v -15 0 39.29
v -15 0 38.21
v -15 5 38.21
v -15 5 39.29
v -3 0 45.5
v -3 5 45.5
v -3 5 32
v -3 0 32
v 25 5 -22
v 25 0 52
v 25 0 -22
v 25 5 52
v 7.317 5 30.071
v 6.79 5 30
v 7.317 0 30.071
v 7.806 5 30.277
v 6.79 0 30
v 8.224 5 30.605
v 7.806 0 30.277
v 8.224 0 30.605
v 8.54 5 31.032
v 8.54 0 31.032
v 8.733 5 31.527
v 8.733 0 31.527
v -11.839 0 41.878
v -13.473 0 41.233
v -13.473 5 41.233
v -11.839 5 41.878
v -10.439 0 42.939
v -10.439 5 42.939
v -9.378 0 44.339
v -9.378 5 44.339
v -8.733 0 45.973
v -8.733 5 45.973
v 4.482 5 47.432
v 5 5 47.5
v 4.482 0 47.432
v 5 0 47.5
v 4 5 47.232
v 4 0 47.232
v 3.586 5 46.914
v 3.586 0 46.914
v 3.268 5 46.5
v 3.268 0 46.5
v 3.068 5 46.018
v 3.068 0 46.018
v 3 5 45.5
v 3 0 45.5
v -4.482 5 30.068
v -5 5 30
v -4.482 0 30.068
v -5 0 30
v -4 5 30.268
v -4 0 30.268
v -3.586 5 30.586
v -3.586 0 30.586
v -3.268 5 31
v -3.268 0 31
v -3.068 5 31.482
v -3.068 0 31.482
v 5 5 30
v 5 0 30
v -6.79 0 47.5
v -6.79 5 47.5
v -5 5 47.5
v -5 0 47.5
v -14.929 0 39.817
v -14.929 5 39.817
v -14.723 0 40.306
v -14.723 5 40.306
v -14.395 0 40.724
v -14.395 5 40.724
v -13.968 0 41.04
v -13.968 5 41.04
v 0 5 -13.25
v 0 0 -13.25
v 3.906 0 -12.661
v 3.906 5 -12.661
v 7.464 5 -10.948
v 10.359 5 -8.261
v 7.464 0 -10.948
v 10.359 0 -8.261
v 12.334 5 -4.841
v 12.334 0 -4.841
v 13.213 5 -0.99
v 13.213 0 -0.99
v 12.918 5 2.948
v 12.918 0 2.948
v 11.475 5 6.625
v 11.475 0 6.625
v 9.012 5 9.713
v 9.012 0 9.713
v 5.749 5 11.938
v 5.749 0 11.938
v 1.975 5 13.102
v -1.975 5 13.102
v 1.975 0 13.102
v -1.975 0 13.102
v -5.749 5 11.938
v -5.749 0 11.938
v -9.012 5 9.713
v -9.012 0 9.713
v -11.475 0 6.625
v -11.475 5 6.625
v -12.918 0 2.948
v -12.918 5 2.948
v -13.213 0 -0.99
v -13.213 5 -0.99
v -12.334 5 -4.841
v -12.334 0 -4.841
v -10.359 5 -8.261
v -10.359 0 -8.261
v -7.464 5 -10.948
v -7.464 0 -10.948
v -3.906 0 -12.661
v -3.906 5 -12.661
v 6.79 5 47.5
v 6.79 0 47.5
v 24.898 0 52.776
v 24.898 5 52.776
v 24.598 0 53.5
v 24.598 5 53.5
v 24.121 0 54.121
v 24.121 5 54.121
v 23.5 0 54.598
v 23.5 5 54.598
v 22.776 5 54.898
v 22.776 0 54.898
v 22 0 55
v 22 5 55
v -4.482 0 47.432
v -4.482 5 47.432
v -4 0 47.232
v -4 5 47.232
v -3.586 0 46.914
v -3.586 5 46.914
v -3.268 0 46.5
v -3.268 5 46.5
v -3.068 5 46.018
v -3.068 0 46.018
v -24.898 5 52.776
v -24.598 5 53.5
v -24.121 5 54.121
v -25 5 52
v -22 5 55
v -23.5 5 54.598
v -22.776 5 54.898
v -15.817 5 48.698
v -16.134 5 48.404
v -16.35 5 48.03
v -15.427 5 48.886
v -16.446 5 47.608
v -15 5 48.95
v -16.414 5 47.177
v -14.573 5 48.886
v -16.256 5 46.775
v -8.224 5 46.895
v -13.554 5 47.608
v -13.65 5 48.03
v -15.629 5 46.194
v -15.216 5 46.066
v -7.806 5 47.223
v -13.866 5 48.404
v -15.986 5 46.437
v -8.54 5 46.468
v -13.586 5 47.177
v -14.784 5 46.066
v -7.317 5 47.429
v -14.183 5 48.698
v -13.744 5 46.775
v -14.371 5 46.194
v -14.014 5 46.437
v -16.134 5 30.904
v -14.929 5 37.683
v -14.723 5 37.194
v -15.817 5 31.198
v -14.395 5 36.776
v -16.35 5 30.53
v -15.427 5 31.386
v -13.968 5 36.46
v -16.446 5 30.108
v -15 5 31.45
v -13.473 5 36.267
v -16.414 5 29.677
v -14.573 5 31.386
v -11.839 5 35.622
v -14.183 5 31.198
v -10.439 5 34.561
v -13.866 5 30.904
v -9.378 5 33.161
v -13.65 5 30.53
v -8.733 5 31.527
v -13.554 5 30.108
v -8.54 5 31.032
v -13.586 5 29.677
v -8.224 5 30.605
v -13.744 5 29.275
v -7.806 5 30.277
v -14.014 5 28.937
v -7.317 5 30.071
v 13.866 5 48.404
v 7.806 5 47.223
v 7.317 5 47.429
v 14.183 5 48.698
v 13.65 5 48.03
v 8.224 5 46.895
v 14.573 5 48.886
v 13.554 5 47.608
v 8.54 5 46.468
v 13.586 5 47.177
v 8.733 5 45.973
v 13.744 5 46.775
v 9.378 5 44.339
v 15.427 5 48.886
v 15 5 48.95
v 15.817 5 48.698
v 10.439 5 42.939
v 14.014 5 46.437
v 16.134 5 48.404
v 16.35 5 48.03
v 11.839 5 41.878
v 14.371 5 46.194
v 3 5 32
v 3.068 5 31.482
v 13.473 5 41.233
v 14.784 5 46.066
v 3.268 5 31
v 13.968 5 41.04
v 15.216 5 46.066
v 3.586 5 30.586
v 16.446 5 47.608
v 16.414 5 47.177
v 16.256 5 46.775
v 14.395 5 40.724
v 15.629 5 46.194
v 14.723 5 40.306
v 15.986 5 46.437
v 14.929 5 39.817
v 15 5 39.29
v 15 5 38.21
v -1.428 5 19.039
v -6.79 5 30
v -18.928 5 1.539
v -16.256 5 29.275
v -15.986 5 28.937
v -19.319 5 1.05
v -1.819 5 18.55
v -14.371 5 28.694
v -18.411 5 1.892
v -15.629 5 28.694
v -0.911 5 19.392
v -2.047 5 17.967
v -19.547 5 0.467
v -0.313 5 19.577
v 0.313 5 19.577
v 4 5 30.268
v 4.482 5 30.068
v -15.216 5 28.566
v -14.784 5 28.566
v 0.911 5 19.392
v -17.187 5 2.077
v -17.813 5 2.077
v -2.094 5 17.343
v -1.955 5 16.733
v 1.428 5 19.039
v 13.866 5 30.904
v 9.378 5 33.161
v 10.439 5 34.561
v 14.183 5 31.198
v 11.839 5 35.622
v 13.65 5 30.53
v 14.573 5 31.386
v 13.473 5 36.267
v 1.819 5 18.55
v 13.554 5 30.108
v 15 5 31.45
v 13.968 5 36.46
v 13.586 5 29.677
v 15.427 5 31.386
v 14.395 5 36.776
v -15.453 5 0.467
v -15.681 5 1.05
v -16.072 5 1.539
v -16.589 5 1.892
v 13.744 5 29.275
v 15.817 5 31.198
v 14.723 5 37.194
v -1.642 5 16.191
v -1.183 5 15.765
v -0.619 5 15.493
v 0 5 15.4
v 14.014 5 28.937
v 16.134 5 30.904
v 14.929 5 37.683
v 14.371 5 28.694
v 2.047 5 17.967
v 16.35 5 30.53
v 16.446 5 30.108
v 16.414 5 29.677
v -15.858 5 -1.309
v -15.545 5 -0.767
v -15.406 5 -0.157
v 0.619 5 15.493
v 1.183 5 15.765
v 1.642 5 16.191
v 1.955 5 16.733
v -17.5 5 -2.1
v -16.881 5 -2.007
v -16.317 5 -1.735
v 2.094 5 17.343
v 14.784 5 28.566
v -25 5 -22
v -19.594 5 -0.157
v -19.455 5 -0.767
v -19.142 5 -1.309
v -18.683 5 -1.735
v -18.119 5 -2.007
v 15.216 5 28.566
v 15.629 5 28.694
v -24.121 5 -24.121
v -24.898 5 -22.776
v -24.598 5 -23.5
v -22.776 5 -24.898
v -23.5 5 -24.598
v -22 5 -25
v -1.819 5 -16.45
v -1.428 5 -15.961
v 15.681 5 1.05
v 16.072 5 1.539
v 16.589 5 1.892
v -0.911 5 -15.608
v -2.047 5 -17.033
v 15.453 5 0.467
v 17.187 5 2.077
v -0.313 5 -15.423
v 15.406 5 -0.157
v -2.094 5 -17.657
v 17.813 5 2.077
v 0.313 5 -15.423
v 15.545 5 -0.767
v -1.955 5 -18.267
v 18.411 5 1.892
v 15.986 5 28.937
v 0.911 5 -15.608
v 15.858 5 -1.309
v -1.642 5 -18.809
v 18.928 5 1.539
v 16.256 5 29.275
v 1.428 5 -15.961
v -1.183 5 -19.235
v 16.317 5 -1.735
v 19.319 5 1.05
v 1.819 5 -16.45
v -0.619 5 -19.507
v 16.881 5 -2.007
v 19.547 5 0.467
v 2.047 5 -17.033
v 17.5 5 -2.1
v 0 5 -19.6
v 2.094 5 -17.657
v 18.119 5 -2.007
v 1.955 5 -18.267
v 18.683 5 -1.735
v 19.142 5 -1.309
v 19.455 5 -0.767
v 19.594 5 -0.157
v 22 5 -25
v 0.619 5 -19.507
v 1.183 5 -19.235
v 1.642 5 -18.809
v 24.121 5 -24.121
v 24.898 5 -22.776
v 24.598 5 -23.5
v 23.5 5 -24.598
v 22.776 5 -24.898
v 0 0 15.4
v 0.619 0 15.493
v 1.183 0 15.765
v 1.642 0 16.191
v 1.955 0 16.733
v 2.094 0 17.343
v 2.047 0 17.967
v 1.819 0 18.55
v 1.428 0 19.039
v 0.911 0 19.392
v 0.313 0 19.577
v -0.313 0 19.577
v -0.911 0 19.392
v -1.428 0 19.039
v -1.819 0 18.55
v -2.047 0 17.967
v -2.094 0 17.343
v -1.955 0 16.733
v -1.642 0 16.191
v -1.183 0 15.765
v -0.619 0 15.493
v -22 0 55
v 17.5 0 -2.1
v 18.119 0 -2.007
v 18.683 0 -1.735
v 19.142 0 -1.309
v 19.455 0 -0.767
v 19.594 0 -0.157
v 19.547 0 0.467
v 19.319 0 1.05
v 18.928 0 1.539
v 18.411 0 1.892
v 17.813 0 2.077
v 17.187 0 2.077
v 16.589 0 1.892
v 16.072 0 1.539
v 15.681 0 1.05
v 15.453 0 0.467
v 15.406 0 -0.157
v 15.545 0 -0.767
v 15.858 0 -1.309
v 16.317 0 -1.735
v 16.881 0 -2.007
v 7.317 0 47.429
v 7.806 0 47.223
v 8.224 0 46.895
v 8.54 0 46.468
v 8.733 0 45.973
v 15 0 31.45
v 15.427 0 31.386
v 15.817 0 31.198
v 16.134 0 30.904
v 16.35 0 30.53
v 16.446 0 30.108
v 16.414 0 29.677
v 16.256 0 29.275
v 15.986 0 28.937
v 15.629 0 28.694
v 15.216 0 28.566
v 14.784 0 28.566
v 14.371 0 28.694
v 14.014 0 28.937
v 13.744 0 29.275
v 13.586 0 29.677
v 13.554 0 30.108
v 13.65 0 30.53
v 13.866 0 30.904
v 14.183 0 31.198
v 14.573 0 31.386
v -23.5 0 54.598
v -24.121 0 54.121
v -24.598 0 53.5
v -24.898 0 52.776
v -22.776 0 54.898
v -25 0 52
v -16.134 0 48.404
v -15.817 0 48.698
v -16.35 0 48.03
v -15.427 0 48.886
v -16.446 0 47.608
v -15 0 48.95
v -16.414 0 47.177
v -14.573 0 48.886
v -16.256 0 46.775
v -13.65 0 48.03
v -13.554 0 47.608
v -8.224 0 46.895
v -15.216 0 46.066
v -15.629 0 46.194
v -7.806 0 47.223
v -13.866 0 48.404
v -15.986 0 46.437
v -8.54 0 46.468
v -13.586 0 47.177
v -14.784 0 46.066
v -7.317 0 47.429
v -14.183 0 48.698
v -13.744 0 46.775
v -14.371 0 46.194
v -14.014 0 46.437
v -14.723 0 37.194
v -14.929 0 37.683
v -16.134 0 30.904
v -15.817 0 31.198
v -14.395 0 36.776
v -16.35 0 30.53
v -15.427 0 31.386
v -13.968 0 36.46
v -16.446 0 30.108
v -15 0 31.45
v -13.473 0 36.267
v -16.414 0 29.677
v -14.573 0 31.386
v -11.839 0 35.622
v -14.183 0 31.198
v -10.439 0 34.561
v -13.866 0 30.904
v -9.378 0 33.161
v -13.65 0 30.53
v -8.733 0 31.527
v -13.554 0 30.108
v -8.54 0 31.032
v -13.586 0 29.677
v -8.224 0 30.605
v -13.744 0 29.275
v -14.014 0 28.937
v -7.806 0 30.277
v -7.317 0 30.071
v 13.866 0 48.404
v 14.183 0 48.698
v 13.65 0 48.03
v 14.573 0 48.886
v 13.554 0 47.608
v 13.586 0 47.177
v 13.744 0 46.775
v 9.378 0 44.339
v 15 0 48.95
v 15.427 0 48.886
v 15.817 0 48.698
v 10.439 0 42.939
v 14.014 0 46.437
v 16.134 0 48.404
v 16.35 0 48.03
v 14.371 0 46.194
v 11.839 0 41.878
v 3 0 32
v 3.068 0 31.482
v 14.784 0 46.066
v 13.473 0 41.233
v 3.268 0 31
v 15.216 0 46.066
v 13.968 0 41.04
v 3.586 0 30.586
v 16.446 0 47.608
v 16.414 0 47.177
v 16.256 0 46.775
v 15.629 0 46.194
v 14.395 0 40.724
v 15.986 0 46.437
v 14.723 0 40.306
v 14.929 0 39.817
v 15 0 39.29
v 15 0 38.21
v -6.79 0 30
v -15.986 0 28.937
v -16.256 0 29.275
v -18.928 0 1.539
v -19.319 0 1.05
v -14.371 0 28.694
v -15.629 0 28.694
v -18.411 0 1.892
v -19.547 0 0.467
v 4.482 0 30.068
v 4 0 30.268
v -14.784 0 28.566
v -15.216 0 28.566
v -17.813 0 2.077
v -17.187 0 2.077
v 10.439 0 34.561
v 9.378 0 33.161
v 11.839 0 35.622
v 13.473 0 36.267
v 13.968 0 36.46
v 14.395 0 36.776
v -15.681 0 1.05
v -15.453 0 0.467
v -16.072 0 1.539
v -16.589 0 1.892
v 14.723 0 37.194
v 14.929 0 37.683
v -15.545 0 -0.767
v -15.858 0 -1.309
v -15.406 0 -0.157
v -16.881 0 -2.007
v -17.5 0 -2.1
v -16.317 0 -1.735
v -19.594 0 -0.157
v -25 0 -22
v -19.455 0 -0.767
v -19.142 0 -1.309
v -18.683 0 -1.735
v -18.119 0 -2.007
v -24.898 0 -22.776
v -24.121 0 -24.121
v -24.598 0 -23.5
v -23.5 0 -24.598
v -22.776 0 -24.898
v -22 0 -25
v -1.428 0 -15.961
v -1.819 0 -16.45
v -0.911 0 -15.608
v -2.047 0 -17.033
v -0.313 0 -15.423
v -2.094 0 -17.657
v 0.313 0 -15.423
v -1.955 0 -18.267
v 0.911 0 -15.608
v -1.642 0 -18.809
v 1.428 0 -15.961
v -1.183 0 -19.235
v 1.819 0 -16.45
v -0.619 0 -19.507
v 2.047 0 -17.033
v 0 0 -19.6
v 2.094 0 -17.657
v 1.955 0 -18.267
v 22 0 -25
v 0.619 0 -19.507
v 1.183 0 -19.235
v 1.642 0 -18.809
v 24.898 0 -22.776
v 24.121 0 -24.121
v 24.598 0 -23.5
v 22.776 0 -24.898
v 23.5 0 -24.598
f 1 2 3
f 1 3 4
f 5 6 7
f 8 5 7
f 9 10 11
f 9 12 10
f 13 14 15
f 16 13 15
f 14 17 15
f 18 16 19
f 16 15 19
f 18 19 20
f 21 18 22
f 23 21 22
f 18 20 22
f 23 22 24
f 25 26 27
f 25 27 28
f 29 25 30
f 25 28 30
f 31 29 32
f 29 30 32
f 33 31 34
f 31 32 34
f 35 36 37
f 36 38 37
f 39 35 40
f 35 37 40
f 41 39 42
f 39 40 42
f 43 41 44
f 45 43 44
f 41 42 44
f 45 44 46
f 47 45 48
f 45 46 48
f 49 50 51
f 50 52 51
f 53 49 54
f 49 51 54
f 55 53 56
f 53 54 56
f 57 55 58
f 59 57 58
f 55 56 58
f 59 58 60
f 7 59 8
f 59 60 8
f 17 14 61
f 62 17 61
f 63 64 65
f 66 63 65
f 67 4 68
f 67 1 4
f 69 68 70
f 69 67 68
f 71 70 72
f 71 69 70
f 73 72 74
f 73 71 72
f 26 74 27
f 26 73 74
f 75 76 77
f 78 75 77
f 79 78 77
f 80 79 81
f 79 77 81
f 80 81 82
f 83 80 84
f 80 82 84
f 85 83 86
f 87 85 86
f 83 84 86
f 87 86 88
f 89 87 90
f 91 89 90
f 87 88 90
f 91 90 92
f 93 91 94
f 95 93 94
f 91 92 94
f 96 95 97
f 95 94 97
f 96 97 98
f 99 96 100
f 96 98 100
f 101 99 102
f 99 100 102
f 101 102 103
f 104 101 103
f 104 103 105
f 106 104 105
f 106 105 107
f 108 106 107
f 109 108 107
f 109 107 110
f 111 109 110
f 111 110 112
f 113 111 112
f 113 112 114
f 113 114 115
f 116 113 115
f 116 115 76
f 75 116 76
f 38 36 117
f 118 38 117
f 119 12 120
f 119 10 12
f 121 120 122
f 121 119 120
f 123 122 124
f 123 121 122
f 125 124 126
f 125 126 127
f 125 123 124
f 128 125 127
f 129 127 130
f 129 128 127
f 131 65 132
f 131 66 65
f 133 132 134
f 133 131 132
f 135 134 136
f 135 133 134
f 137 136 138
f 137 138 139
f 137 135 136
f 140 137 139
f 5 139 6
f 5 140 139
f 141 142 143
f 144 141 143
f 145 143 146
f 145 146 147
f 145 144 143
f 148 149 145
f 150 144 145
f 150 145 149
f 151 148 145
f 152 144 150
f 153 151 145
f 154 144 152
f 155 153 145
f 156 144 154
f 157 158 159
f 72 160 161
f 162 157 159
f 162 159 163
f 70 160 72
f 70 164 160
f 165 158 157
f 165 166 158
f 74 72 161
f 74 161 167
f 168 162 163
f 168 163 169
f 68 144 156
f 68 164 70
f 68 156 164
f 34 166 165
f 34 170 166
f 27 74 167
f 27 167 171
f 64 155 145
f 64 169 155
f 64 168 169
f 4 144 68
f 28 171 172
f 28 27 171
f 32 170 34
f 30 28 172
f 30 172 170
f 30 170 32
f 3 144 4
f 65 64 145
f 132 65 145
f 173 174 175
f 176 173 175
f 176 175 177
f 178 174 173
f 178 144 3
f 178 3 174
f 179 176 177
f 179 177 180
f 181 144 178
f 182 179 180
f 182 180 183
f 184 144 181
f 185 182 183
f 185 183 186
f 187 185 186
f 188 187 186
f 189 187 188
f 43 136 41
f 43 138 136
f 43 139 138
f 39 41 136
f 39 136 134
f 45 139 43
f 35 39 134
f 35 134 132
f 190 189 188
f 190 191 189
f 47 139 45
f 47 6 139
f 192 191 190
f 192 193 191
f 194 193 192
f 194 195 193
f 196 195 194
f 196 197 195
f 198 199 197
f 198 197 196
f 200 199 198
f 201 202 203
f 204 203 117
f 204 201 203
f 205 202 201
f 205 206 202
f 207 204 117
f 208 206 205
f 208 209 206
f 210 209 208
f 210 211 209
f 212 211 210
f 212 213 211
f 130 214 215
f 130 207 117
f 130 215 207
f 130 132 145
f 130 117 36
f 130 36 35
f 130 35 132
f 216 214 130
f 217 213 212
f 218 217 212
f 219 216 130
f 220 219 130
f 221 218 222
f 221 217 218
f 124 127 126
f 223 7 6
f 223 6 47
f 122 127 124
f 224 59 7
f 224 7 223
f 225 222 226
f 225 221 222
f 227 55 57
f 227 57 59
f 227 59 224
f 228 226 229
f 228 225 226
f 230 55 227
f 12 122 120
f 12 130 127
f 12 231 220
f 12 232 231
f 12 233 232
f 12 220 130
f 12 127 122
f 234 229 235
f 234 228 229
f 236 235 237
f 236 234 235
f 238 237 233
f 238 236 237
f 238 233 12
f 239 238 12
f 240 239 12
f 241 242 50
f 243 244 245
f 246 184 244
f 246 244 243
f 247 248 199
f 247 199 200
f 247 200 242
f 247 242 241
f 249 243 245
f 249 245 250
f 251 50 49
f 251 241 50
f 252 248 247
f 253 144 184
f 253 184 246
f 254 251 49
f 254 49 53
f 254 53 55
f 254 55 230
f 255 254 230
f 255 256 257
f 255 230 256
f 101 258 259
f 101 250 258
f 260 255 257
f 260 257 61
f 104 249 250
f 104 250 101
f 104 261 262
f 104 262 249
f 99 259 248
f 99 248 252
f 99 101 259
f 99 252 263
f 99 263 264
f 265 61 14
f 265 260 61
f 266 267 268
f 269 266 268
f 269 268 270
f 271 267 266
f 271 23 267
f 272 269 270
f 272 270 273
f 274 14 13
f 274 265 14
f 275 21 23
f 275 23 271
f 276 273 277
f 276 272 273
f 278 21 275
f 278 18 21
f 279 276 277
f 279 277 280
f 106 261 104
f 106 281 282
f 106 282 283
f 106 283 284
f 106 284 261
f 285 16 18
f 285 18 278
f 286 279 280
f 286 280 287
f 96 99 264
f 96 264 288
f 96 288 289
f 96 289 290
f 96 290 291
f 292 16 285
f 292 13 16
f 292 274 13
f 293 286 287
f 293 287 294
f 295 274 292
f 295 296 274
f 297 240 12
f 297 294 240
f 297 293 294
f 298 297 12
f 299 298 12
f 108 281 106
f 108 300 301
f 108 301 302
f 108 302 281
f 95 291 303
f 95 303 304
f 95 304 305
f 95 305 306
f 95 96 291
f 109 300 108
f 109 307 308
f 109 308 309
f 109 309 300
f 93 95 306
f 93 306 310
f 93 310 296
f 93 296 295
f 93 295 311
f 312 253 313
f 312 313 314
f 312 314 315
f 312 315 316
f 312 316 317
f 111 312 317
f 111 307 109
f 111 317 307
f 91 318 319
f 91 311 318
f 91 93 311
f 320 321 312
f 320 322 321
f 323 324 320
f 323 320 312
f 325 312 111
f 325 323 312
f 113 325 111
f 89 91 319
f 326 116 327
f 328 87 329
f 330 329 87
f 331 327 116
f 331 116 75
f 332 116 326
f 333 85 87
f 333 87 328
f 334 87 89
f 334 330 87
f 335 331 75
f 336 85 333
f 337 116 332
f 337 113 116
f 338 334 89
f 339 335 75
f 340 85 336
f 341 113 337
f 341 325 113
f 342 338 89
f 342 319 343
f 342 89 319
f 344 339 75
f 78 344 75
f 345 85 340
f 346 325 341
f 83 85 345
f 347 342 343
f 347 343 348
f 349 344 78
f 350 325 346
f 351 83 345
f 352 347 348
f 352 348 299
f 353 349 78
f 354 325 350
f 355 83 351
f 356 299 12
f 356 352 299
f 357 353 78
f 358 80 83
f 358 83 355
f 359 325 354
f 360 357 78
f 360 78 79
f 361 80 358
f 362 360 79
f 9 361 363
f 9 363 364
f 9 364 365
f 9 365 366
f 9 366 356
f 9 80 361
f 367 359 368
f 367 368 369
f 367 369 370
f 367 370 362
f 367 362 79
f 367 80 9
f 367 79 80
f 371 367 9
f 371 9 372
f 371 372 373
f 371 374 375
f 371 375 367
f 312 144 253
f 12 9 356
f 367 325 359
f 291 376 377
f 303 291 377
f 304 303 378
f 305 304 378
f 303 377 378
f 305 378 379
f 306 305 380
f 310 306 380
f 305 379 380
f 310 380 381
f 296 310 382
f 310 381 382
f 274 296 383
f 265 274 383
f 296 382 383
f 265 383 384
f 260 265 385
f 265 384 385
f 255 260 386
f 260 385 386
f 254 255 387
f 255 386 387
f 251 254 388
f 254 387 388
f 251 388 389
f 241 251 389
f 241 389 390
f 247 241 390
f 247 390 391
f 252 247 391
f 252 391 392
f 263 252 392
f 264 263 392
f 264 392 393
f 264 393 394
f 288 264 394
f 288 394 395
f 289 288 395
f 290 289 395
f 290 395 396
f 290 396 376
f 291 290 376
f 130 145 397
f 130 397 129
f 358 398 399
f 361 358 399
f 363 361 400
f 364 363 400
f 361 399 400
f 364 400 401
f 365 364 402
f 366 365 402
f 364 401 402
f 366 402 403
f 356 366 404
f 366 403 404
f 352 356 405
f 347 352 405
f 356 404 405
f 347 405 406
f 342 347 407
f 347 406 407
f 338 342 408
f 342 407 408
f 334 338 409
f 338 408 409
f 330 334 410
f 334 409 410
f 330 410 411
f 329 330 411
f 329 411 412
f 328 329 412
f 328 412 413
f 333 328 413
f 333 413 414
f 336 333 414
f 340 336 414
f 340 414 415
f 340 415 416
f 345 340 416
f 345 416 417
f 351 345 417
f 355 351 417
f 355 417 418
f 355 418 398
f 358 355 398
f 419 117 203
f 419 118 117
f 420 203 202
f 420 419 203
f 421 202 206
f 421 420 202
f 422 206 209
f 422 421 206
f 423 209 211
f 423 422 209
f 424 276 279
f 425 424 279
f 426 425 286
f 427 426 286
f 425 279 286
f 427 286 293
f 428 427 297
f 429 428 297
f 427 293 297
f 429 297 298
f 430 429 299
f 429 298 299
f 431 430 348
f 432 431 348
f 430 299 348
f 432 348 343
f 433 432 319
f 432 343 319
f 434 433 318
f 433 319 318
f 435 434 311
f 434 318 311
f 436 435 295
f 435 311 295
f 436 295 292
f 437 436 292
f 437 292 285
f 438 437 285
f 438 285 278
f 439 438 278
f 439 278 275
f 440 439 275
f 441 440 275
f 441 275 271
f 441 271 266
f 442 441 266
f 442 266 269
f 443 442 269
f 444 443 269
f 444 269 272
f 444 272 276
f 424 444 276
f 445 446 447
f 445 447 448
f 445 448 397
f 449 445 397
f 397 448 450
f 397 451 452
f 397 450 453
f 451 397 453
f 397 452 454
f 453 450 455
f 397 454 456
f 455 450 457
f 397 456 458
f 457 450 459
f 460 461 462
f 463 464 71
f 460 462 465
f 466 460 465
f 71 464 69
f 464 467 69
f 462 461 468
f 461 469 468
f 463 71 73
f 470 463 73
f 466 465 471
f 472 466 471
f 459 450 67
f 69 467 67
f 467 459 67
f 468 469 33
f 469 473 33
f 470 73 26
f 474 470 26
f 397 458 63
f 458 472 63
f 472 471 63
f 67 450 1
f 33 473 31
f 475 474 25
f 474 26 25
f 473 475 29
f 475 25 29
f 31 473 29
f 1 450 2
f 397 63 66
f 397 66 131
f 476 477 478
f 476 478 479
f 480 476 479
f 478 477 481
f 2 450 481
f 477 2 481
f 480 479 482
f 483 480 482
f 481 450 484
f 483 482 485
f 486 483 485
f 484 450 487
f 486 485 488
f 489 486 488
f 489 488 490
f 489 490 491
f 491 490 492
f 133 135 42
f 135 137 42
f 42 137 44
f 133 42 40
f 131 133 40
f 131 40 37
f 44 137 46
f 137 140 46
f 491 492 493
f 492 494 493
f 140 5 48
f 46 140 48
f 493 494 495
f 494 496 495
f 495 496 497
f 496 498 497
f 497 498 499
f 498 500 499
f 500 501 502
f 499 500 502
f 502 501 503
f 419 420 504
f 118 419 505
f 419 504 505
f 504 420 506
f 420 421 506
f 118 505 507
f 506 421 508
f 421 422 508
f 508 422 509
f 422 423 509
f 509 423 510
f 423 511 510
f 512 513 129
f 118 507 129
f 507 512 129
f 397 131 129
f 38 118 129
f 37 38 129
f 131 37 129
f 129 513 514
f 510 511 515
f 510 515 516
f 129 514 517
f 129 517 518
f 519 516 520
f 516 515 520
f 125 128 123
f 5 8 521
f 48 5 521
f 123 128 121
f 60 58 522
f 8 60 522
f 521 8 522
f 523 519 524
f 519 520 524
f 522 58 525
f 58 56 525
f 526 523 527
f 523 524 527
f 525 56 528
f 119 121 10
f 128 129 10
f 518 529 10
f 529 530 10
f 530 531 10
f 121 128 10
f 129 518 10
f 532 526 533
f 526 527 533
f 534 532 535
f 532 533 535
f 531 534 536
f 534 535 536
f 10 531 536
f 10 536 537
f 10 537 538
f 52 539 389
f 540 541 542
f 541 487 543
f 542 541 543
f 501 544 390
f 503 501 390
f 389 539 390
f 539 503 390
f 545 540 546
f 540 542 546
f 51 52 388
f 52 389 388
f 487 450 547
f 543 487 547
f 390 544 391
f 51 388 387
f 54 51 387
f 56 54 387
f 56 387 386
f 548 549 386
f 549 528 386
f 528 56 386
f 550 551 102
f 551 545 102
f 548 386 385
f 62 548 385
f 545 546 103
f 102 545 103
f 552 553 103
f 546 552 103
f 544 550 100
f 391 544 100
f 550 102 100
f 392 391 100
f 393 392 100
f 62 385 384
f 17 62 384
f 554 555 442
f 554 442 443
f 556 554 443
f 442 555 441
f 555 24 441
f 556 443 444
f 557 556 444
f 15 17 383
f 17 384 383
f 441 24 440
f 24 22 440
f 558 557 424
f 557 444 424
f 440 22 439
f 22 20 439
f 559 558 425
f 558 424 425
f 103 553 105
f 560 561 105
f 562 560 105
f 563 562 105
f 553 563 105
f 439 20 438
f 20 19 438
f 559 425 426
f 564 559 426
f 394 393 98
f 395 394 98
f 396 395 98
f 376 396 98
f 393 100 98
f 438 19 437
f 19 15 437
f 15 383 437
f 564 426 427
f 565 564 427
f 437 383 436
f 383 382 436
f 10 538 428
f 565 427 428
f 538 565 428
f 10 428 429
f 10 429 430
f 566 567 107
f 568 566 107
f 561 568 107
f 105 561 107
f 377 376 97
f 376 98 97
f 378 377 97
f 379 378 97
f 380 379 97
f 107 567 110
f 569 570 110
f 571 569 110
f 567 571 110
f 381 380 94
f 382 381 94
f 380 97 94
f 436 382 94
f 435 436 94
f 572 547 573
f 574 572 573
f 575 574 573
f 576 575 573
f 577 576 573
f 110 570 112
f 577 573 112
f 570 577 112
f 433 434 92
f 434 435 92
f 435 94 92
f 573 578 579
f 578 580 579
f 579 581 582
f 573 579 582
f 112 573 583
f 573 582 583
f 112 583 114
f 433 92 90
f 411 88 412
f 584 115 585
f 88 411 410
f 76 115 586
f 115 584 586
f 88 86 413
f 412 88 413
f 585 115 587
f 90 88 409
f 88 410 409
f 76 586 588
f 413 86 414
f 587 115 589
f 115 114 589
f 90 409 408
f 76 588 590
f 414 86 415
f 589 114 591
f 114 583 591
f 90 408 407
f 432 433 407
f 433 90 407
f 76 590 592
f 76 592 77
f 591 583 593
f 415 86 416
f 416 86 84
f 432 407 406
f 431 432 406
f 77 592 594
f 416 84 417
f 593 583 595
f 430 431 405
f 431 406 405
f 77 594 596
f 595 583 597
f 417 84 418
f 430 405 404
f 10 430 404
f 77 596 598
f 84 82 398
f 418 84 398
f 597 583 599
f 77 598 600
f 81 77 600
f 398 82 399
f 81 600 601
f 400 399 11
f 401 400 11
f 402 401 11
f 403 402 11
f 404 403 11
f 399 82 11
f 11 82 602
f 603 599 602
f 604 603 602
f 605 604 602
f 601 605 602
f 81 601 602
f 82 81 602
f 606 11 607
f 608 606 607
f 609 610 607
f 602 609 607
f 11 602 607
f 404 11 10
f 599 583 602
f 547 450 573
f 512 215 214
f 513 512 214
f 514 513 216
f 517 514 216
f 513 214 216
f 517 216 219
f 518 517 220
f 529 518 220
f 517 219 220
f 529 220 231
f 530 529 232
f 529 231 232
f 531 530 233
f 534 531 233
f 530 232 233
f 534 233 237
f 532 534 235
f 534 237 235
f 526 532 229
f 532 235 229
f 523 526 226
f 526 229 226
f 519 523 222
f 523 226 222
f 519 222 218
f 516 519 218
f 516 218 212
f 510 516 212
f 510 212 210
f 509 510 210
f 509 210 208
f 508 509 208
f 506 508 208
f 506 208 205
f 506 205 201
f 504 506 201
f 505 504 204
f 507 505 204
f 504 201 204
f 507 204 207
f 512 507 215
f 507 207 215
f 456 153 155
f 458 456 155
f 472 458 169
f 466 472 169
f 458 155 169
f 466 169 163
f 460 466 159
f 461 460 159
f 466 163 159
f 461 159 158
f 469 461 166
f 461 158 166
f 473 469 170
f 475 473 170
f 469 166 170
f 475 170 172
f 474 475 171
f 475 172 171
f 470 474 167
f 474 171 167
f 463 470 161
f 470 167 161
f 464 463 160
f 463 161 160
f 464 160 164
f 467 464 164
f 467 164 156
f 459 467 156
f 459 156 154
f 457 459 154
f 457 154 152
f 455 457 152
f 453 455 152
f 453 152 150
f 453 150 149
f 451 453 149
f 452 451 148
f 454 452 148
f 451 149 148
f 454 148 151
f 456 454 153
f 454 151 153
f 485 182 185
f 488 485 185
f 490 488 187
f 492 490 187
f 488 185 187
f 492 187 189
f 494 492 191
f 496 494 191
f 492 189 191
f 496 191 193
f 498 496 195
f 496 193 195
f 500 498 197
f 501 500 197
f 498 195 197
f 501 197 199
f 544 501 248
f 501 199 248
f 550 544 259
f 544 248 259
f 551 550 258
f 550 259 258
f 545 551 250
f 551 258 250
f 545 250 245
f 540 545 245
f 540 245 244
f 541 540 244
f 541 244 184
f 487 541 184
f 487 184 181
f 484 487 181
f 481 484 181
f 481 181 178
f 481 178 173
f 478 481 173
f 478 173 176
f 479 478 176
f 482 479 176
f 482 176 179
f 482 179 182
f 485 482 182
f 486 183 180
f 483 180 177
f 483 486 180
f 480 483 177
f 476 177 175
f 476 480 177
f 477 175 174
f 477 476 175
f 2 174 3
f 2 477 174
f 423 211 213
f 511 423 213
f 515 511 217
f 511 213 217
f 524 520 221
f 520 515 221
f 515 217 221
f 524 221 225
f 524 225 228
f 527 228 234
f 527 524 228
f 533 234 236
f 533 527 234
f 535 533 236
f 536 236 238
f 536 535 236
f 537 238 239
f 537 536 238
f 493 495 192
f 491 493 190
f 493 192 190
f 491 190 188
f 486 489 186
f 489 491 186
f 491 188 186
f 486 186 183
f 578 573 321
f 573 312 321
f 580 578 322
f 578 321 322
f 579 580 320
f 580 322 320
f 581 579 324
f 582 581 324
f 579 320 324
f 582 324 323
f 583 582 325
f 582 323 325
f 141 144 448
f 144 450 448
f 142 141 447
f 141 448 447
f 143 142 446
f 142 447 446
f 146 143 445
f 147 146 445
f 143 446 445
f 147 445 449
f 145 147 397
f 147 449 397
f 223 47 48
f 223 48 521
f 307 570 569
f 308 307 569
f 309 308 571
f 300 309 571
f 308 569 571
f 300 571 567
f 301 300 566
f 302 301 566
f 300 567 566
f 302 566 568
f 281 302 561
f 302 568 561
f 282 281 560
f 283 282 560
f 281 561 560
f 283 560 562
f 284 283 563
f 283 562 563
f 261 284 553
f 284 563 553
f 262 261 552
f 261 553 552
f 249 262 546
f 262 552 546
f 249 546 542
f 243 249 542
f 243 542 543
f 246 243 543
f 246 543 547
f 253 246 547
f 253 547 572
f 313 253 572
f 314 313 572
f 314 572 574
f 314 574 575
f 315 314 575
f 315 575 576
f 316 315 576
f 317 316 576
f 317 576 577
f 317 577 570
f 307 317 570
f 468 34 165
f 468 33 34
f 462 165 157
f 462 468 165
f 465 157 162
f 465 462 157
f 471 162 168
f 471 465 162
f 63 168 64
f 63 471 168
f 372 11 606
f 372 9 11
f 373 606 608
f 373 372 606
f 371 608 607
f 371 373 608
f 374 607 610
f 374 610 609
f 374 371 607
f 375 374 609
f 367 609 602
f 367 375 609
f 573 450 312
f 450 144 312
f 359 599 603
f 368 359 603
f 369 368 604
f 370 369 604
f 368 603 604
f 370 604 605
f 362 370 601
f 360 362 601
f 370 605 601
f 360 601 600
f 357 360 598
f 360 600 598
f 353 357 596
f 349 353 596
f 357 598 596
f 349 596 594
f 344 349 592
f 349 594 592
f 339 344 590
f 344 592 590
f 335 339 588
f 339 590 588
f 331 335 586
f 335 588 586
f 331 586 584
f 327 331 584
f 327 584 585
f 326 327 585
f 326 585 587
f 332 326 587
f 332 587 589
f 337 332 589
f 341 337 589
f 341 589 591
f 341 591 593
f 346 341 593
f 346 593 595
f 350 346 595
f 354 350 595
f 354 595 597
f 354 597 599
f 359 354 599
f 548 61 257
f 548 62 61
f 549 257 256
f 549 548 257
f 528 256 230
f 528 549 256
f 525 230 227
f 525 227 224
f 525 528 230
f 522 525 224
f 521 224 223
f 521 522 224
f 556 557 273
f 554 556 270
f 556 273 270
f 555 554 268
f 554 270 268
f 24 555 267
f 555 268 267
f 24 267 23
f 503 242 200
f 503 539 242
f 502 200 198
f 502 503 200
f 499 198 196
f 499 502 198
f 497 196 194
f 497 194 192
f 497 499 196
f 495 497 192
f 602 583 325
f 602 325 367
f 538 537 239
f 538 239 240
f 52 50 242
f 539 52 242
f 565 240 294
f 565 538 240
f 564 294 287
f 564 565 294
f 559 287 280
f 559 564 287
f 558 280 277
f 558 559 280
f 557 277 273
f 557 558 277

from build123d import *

# Parameters (mm, degrees)
SKETCH_1_W          = 50
SKETCH_1_H          = 50
SKETCH_1_R          = 21.05
EXTRUDE_1_DEPTH     = 5
SKETCH_2_W          = 50
SKETCH_2_H          = 30
SKETCH_2_R          = 1.45
EXTRUDE_2_DEPTH     = 5
FILLET_1_R          = 3
EXTRUDE_START       = -5
SKETCH_4_R          = 21.05
EXTRUDE_3_DEPTH     = 5
SKETCH_5_R          = 13.25
SKETCH_5_R_2        = 2.1
CUT_EXTRUDE_2_DEPTH = 61.621778265
SKETCH_6_R          = 1.45
CUT_EXTRUDE_3_DEPTH = 61.621778265
CUT_EXTRUDE_4_DEPTH = 61.621778265
SKETCH_8_W          = 6
SKETCH_8_H          = 17.5
EXTRUDE_4_DEPTH     = 5
FILLET_2_R          = 2


with BuildPart() as part:
    # 草图1 → 凸台-拉伸1 (new body)
    with BuildSketch(Plane(origin=(0, 0, 0), x_dir=(1, 0, 0), z_dir=(0, 1, 0))):
        Rectangle(SKETCH_1_W, SKETCH_1_H)
        with Locations(Location((0, 0, 0), (0, 0, 270))):
            Circle(SKETCH_1_R, mode=Mode.SUBTRACT)
    extrude(amount=EXTRUDE_1_DEPTH)

    # 草图2 → 凸台-拉伸2 (add)
    with BuildSketch(Plane(origin=(0, 5, 0), x_dir=(1, 0, 0), z_dir=(0, 1, 0))):
        with Locations((0, -40)):
            Rectangle(SKETCH_2_W, SKETCH_2_H)
        with Locations(Location((-15, -47.5, 0), (0, 0, 270))):
            Circle(SKETCH_2_R, mode=Mode.SUBTRACT)
        with Locations(Location((15, -47.5, 0), (0, 0, 270))):
            Circle(SKETCH_2_R, mode=Mode.SUBTRACT)
    extrude(amount=-EXTRUDE_2_DEPTH)

    # 圆角1
    fillet_1_edges = [part.edges().sort_by_distance(p)[0] for p in [
        (25, 2.5, 55),
        (-25, 2.5, 55),
        (-25, 2.5, -25),
        (25, 2.5, -25),
    ]]
    fillet(fillet_1_edges, radius=FILLET_1_R)

    # 草图4 → 凸台-拉伸3 (add)
    with BuildSketch(Plane(origin=(0, 5, 0), x_dir=(1, 0, 0), z_dir=(0, 1, 0)).offset(EXTRUDE_START)):
        Circle(SKETCH_4_R)
    extrude(amount=EXTRUDE_3_DEPTH)

    # 草图5 → 切除-拉伸2 (cut, through all)
    with BuildSketch(Plane.XZ):
        with Locations(Location((0, 0, 0), (0, 0, 270))):
            Circle(SKETCH_5_R)
        with Locations(Location((0, 17.5, 0), (0, 0, 270))):
            Circle(SKETCH_5_R_2)
        with Locations(Location((17.5, 0, 0), (0, 0, 270))):
            Circle(SKETCH_5_R_2)
        with Locations(Location((0, -17.5, 0), (0, 0, 270))):
            Circle(SKETCH_5_R_2)
        with Locations(Location((-17.5, 0, 0), (0, 0, 270))):
            Circle(SKETCH_5_R_2)
    extrude(amount=-CUT_EXTRUDE_2_DEPTH, mode=Mode.SUBTRACT)

    # 草图6 → 切除-拉伸3 (cut, through all)
    with BuildSketch(Plane(origin=(0, 5, 0), x_dir=(1, 0, 0), z_dir=(0, 1, 0))):
        with Locations(Location((-15, -30, 0), (0, 0, 270))):
            Circle(SKETCH_6_R)
        with Locations(Location((15, -30, 0), (0, 0, 270))):
            Circle(SKETCH_6_R)
    extrude(amount=-CUT_EXTRUDE_3_DEPTH, mode=Mode.SUBTRACT)

    # 草图7 → 切除-拉伸4 (cut, through all)
    with BuildSketch(Plane(origin=(0, 5, 0), x_dir=(1, 0, 0), z_dir=(0, 1, 0))):
        with BuildLine():
            Line((8.55, -30), (-8.55, -30))
            ThreePointArc((-8.55, -30), (-10.439161261, -34.560838739), (-15, -36.45))
            Line((-15, -36.45), (-15, -41.05))
            ThreePointArc((-15, -41.05), (-10.439161261, -42.939161261), (-8.55, -47.5))
            Line((-8.55, -47.5), (8.55, -47.5))
            ThreePointArc((8.55, -47.5), (10.439161261, -42.939161261), (15, -41.05))
            Line((15, -41.05), (15, -36.45))
            ThreePointArc((15, -36.45), (10.439161261, -34.560838739), (8.55, -30))
        make_face()
    extrude(amount=-CUT_EXTRUDE_4_DEPTH, mode=Mode.SUBTRACT)

    # 草图8 → 凸台-拉伸4 (add)
    with BuildSketch(Plane(origin=(0, 5, 0), x_dir=(1, 0, 0), z_dir=(0, 1, 0))):
        with Locations((0, -38.75)):
            Rectangle(SKETCH_8_W, SKETCH_8_H)
    extrude(amount=-EXTRUDE_4_DEPTH)

    # 圆角2
    fillet_2_edges = [part.edges().sort_by_distance(p)[0] for p in [
        (-8.55, 2.5, 47.5),
        (-15, 2.5, 41.05),
        (-15, 2.5, 36.45),
        (-8.55, 2.5, 30),
        (8.55, 2.5, 30),
        (15, 2.5, 36.45),
        (15, 2.5, 41.05),
        (8.55, 2.5, 47.5),
        (-3, 2.5, 30),
        (3, 2.5, 30),
        (3, 2.5, 47.5),
        (-3, 2.5, 47.5),
    ]]
    fillet(fillet_2_edges, radius=FILLET_2_R)


solid = part.part
